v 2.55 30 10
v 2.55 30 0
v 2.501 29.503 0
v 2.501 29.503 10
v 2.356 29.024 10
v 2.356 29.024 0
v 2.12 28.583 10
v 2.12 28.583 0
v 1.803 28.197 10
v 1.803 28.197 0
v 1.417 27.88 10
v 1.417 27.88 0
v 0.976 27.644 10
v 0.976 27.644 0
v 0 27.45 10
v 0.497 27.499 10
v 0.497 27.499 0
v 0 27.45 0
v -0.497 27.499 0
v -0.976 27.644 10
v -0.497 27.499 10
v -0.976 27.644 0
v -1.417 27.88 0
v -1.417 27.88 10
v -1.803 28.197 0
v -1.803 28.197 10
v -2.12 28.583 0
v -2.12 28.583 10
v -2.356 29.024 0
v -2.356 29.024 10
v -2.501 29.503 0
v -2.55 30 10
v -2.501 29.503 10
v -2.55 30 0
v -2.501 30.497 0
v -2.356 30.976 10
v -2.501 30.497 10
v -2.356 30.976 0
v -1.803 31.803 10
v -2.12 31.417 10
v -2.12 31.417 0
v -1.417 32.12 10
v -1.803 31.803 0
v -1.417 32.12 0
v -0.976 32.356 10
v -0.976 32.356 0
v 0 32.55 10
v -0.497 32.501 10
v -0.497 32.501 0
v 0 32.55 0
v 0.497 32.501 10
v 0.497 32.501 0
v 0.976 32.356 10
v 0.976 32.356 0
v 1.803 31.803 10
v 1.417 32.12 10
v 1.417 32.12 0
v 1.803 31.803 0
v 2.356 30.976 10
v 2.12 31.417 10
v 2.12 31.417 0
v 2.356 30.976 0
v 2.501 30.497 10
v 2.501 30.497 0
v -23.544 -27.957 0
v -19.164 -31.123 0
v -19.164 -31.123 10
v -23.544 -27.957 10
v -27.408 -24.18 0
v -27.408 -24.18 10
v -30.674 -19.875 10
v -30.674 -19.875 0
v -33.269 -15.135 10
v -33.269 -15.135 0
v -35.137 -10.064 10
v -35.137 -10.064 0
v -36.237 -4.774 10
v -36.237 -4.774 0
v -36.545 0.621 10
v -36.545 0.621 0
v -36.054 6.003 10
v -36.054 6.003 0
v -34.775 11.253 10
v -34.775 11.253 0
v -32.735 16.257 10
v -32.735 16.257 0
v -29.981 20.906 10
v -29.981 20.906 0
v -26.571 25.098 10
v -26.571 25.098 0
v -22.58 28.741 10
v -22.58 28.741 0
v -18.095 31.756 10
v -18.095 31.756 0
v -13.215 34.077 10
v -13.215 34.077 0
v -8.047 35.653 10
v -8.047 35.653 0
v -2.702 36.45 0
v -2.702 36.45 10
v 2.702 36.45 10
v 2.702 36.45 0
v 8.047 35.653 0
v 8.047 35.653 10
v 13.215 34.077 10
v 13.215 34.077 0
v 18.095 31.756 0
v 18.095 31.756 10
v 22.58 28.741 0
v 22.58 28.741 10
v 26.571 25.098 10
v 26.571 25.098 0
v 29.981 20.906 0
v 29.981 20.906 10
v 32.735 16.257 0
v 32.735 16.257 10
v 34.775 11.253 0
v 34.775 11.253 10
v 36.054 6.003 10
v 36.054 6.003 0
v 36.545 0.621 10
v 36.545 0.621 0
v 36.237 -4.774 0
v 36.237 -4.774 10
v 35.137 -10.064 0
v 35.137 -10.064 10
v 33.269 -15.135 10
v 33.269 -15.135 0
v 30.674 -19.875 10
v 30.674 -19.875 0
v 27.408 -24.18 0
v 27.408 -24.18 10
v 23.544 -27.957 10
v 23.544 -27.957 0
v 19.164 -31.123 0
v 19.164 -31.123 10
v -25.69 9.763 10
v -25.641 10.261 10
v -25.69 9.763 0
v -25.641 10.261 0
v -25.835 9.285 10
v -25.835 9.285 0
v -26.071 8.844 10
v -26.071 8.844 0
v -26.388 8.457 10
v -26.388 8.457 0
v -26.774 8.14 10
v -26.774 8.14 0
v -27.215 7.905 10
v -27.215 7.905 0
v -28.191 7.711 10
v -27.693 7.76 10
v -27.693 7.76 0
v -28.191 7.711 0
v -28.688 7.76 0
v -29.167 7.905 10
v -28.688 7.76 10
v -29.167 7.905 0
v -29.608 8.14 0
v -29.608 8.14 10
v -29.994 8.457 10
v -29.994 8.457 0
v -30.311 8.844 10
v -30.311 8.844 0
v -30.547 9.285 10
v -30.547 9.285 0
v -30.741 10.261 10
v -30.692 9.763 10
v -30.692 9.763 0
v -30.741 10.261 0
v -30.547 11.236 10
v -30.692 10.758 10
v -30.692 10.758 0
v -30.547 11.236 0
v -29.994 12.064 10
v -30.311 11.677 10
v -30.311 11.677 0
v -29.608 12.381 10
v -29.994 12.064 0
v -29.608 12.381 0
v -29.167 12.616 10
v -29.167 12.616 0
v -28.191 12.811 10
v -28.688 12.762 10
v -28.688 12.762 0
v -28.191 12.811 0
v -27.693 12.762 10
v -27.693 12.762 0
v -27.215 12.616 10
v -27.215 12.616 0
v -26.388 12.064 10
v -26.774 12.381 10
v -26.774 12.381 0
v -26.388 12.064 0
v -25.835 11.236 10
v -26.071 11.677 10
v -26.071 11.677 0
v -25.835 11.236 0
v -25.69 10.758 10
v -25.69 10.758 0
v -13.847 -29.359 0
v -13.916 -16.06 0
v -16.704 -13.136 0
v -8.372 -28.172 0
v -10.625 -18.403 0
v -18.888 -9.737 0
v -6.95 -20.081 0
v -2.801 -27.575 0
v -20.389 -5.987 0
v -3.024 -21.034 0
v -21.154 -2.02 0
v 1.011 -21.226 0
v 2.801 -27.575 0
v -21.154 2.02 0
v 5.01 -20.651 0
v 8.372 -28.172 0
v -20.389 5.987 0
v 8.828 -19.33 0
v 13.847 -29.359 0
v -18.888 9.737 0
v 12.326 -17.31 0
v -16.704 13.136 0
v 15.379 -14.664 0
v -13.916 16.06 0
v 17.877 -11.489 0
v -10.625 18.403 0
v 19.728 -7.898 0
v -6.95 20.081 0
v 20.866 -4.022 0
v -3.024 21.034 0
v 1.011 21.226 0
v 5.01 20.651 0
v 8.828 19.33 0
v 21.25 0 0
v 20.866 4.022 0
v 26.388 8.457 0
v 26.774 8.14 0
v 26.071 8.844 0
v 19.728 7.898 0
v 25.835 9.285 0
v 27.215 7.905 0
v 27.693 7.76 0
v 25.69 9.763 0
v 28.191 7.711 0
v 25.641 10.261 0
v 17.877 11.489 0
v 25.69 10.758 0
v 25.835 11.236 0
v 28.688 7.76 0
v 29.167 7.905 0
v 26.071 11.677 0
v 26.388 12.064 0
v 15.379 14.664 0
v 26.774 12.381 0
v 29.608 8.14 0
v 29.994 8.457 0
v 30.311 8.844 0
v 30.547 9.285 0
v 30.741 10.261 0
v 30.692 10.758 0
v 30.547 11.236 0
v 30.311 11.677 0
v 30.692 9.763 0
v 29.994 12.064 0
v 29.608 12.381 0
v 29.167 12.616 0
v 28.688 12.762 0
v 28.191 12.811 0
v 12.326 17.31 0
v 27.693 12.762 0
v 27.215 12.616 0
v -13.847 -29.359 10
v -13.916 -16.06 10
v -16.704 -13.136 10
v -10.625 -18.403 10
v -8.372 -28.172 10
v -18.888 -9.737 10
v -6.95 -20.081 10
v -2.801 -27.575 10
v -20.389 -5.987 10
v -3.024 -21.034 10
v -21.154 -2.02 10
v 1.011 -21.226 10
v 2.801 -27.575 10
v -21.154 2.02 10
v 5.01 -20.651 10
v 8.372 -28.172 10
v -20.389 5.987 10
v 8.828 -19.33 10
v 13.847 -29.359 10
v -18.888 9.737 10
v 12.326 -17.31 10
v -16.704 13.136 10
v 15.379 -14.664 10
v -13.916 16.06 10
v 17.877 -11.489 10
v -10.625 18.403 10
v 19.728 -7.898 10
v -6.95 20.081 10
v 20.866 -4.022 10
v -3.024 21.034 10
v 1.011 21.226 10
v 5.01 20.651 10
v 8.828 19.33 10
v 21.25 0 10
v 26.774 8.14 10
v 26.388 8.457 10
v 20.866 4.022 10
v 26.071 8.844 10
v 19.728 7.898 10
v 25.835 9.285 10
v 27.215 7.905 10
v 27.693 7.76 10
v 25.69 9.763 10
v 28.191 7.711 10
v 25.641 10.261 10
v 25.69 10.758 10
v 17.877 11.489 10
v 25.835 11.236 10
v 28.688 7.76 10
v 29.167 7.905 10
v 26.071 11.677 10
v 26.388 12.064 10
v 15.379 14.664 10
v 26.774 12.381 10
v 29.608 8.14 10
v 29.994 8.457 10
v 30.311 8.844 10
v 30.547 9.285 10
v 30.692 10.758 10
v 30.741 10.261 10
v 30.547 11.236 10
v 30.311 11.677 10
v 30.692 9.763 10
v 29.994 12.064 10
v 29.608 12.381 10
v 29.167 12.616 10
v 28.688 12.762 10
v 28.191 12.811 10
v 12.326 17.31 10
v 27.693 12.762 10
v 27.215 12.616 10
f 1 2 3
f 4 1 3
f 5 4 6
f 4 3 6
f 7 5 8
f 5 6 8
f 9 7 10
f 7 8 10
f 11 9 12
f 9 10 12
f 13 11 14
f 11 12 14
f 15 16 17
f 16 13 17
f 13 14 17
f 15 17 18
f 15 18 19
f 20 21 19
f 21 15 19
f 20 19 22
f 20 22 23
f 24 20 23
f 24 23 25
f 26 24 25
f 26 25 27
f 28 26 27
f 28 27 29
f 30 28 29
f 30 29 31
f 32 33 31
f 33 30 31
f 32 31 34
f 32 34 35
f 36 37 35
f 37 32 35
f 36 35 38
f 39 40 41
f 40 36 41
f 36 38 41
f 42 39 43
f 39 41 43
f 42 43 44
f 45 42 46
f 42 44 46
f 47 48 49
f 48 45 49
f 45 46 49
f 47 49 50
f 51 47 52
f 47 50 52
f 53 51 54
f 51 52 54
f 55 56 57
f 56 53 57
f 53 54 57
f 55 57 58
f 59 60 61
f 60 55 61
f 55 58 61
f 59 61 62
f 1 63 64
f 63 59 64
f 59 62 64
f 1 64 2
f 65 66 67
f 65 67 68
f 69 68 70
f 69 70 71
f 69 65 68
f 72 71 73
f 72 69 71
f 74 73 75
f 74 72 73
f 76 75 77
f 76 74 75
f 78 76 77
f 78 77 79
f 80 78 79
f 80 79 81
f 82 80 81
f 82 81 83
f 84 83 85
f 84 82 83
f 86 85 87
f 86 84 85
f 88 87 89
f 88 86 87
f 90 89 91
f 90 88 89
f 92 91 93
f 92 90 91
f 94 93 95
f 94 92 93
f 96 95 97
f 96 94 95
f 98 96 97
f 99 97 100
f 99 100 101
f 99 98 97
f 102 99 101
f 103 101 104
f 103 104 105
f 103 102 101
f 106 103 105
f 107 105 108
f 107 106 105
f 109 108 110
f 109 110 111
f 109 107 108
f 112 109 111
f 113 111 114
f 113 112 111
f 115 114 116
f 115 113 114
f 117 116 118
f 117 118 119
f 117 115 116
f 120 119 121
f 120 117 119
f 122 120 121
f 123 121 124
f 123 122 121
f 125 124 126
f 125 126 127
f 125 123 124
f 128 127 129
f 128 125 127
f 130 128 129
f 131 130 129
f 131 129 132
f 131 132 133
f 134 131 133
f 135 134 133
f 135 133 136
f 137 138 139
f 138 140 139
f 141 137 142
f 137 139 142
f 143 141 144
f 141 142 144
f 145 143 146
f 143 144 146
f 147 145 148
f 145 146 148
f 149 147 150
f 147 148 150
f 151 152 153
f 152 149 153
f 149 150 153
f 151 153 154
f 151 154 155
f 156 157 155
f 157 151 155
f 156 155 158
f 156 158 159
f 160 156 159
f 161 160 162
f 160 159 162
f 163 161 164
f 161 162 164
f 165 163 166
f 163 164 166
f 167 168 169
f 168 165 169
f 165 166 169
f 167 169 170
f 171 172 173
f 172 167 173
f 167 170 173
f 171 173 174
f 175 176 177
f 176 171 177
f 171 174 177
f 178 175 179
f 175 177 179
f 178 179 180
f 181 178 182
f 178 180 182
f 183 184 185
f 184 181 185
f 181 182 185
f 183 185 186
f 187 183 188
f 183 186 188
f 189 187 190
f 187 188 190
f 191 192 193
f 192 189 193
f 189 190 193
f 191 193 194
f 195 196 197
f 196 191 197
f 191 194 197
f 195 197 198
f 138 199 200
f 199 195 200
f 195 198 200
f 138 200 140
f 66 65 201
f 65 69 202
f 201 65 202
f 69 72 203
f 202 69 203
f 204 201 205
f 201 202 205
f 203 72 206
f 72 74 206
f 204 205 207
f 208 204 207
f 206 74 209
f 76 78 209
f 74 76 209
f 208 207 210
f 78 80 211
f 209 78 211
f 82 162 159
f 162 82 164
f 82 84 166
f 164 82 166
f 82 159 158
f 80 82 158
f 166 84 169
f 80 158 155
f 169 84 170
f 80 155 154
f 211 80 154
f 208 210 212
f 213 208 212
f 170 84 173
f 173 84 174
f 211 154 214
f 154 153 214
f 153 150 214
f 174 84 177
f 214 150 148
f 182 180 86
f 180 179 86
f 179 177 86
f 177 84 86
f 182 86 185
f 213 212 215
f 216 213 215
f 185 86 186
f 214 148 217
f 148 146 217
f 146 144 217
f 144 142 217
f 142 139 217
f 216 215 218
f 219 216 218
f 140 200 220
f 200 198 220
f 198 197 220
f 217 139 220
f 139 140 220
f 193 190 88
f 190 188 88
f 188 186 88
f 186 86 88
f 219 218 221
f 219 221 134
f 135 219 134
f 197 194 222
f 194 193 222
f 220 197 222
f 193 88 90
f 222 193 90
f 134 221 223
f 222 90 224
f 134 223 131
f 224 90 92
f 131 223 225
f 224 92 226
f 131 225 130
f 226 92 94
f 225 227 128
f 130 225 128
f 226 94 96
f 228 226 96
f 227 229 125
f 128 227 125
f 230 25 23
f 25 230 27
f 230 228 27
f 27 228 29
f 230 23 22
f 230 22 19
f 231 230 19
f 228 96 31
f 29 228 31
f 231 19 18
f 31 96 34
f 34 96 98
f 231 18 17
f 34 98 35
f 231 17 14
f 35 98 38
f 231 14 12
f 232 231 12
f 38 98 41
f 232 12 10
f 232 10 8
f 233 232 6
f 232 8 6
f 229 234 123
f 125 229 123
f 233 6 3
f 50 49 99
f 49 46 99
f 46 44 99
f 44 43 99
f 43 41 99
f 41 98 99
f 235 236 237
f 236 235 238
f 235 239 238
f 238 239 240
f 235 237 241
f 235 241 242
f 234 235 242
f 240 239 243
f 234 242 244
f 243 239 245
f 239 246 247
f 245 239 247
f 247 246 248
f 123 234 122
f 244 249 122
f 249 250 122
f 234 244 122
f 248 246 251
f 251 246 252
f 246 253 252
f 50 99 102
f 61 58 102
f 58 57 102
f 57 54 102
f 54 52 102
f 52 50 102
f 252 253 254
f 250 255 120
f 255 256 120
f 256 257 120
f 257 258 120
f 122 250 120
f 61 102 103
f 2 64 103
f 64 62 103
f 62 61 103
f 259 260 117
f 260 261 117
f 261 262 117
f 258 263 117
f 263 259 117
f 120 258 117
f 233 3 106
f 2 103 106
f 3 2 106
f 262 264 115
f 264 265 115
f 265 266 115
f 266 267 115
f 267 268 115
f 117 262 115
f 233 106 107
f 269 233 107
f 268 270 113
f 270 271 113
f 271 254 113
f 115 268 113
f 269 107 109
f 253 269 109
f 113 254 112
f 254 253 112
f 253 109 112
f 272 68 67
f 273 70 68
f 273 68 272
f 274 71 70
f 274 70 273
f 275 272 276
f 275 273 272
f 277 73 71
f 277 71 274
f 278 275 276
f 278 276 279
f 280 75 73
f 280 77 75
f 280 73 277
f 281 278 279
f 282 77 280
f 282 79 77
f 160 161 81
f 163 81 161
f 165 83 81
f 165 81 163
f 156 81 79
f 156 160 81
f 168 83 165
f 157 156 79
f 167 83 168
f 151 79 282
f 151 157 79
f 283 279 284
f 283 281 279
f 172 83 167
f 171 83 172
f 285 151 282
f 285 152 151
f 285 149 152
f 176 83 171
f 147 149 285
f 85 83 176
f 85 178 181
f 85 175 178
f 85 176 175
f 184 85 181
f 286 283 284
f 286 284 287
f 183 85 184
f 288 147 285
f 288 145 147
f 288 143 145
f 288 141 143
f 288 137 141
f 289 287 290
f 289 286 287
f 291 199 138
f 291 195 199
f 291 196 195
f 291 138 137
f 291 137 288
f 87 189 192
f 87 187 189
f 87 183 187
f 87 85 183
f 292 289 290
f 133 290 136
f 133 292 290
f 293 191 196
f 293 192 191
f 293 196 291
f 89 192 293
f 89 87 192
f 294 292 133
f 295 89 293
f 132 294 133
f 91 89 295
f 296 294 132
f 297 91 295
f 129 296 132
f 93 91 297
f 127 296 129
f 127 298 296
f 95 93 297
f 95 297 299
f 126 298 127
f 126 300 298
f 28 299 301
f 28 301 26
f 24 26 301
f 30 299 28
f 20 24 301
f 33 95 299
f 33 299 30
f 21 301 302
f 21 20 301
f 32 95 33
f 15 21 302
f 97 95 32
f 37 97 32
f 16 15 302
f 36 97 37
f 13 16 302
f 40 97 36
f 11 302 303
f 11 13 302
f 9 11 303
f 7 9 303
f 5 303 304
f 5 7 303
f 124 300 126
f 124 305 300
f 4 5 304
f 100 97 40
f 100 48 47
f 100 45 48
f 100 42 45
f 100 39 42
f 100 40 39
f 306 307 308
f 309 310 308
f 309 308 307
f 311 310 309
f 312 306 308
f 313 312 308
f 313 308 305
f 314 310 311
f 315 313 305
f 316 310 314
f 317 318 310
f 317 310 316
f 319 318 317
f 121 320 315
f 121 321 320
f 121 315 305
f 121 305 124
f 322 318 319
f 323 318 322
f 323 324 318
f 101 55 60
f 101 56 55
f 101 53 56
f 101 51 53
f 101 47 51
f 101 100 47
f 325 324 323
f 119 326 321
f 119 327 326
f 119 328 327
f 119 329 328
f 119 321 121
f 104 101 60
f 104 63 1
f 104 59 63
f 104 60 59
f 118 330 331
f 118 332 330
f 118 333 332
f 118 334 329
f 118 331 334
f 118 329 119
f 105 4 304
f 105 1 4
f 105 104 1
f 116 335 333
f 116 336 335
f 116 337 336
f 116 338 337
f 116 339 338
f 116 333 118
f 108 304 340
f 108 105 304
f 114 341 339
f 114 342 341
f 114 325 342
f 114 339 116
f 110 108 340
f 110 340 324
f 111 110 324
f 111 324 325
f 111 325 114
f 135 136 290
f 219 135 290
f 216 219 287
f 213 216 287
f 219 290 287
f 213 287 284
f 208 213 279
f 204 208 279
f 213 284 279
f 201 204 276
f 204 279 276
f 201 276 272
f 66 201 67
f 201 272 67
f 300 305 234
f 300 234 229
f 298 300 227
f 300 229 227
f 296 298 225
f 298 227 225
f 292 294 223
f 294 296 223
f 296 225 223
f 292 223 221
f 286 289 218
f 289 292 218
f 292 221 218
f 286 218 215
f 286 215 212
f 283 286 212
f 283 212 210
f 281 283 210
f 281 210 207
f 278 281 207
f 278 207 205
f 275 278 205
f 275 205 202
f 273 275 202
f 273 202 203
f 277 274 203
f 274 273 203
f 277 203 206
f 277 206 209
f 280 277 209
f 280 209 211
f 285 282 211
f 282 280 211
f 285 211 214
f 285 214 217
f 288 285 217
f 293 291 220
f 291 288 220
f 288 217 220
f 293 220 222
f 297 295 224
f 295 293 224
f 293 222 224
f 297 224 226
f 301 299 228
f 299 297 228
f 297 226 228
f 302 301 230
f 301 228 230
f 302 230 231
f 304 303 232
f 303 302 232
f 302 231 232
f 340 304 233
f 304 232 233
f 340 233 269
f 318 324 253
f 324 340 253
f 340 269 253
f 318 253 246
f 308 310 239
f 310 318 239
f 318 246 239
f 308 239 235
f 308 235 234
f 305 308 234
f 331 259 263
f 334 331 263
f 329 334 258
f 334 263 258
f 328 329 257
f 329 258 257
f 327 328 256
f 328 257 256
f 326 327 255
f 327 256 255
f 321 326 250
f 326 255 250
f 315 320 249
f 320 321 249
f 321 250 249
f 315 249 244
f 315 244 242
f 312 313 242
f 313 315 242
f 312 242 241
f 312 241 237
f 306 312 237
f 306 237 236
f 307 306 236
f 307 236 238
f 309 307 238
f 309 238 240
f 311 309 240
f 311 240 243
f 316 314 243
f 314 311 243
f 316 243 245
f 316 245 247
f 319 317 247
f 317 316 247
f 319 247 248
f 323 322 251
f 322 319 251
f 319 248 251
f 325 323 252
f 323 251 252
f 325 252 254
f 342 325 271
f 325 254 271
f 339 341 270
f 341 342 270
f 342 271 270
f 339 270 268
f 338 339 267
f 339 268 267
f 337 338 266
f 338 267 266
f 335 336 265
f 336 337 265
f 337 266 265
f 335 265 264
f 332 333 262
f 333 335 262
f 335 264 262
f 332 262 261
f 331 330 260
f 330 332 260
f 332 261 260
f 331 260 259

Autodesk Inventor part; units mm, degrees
ref_plane "YZ Plane" through (0, 0, 0) normal (1, 0, 0) x (0, 1, 0)
ref_plane "XZ Plane" through (0, 0, 0) normal (0, 1, 0) x (-1, 0, 0)
ref_plane "XY Plane" through (0, 0, 0) normal (0, 0, 1) x (1, 0, 0)
sketch "スケッチ1" plane through (0, 0, 0) normal (0, 0, 1) x (1, 0, 0)
  circle A0 centre (0, 0) radius 21.25
  circle A1 centre (0, 0) radius 36.55
  line L0 (0, 0) -> (-28.1908, 10.2606) construction
  line L1 (0, 0) -> (28.1908, 10.2606) construction
  line L2 (-39.5959, 0) -> (43.1917, 0) construction
  line L3 (0, 0) -> (0, 30) construction
  circle A2 centre (-28.1908, 10.2606) radius 2.55
  circle A3 centre (0, 30) radius 2.55
  circle A4 centre (28.1908, 10.2606) radius 2.55
  dimension "d0" = 73.1
  dimension "d1" = 42.5
  dimension "d2" = 30
  dimension "d3" = 30
  dimension "d4" = 20
  dimension "d5" = 20
  dimension "d6" = 30
  dimension "d7" = 5.1
  dimension "d8" = 5.1
  dimension "d9" = 5.1
extrude "押し出し1" add sketch "スケッチ1" along normal blind 10
sketch "スケッチ2" plane through (0, 0, 10) normal (0, 0, 1) x (1, 0, 0)
  line L0 (0, 0) -> (0, -80) construction
  circle A0 centre (0, -80) radius 52.5
  dimension "d12" = 80
  dimension "d16" = 105
extrude "押し出し2" cut sketch "スケッチ2" against normal blind 10
properties part number "円 42.5mm"
